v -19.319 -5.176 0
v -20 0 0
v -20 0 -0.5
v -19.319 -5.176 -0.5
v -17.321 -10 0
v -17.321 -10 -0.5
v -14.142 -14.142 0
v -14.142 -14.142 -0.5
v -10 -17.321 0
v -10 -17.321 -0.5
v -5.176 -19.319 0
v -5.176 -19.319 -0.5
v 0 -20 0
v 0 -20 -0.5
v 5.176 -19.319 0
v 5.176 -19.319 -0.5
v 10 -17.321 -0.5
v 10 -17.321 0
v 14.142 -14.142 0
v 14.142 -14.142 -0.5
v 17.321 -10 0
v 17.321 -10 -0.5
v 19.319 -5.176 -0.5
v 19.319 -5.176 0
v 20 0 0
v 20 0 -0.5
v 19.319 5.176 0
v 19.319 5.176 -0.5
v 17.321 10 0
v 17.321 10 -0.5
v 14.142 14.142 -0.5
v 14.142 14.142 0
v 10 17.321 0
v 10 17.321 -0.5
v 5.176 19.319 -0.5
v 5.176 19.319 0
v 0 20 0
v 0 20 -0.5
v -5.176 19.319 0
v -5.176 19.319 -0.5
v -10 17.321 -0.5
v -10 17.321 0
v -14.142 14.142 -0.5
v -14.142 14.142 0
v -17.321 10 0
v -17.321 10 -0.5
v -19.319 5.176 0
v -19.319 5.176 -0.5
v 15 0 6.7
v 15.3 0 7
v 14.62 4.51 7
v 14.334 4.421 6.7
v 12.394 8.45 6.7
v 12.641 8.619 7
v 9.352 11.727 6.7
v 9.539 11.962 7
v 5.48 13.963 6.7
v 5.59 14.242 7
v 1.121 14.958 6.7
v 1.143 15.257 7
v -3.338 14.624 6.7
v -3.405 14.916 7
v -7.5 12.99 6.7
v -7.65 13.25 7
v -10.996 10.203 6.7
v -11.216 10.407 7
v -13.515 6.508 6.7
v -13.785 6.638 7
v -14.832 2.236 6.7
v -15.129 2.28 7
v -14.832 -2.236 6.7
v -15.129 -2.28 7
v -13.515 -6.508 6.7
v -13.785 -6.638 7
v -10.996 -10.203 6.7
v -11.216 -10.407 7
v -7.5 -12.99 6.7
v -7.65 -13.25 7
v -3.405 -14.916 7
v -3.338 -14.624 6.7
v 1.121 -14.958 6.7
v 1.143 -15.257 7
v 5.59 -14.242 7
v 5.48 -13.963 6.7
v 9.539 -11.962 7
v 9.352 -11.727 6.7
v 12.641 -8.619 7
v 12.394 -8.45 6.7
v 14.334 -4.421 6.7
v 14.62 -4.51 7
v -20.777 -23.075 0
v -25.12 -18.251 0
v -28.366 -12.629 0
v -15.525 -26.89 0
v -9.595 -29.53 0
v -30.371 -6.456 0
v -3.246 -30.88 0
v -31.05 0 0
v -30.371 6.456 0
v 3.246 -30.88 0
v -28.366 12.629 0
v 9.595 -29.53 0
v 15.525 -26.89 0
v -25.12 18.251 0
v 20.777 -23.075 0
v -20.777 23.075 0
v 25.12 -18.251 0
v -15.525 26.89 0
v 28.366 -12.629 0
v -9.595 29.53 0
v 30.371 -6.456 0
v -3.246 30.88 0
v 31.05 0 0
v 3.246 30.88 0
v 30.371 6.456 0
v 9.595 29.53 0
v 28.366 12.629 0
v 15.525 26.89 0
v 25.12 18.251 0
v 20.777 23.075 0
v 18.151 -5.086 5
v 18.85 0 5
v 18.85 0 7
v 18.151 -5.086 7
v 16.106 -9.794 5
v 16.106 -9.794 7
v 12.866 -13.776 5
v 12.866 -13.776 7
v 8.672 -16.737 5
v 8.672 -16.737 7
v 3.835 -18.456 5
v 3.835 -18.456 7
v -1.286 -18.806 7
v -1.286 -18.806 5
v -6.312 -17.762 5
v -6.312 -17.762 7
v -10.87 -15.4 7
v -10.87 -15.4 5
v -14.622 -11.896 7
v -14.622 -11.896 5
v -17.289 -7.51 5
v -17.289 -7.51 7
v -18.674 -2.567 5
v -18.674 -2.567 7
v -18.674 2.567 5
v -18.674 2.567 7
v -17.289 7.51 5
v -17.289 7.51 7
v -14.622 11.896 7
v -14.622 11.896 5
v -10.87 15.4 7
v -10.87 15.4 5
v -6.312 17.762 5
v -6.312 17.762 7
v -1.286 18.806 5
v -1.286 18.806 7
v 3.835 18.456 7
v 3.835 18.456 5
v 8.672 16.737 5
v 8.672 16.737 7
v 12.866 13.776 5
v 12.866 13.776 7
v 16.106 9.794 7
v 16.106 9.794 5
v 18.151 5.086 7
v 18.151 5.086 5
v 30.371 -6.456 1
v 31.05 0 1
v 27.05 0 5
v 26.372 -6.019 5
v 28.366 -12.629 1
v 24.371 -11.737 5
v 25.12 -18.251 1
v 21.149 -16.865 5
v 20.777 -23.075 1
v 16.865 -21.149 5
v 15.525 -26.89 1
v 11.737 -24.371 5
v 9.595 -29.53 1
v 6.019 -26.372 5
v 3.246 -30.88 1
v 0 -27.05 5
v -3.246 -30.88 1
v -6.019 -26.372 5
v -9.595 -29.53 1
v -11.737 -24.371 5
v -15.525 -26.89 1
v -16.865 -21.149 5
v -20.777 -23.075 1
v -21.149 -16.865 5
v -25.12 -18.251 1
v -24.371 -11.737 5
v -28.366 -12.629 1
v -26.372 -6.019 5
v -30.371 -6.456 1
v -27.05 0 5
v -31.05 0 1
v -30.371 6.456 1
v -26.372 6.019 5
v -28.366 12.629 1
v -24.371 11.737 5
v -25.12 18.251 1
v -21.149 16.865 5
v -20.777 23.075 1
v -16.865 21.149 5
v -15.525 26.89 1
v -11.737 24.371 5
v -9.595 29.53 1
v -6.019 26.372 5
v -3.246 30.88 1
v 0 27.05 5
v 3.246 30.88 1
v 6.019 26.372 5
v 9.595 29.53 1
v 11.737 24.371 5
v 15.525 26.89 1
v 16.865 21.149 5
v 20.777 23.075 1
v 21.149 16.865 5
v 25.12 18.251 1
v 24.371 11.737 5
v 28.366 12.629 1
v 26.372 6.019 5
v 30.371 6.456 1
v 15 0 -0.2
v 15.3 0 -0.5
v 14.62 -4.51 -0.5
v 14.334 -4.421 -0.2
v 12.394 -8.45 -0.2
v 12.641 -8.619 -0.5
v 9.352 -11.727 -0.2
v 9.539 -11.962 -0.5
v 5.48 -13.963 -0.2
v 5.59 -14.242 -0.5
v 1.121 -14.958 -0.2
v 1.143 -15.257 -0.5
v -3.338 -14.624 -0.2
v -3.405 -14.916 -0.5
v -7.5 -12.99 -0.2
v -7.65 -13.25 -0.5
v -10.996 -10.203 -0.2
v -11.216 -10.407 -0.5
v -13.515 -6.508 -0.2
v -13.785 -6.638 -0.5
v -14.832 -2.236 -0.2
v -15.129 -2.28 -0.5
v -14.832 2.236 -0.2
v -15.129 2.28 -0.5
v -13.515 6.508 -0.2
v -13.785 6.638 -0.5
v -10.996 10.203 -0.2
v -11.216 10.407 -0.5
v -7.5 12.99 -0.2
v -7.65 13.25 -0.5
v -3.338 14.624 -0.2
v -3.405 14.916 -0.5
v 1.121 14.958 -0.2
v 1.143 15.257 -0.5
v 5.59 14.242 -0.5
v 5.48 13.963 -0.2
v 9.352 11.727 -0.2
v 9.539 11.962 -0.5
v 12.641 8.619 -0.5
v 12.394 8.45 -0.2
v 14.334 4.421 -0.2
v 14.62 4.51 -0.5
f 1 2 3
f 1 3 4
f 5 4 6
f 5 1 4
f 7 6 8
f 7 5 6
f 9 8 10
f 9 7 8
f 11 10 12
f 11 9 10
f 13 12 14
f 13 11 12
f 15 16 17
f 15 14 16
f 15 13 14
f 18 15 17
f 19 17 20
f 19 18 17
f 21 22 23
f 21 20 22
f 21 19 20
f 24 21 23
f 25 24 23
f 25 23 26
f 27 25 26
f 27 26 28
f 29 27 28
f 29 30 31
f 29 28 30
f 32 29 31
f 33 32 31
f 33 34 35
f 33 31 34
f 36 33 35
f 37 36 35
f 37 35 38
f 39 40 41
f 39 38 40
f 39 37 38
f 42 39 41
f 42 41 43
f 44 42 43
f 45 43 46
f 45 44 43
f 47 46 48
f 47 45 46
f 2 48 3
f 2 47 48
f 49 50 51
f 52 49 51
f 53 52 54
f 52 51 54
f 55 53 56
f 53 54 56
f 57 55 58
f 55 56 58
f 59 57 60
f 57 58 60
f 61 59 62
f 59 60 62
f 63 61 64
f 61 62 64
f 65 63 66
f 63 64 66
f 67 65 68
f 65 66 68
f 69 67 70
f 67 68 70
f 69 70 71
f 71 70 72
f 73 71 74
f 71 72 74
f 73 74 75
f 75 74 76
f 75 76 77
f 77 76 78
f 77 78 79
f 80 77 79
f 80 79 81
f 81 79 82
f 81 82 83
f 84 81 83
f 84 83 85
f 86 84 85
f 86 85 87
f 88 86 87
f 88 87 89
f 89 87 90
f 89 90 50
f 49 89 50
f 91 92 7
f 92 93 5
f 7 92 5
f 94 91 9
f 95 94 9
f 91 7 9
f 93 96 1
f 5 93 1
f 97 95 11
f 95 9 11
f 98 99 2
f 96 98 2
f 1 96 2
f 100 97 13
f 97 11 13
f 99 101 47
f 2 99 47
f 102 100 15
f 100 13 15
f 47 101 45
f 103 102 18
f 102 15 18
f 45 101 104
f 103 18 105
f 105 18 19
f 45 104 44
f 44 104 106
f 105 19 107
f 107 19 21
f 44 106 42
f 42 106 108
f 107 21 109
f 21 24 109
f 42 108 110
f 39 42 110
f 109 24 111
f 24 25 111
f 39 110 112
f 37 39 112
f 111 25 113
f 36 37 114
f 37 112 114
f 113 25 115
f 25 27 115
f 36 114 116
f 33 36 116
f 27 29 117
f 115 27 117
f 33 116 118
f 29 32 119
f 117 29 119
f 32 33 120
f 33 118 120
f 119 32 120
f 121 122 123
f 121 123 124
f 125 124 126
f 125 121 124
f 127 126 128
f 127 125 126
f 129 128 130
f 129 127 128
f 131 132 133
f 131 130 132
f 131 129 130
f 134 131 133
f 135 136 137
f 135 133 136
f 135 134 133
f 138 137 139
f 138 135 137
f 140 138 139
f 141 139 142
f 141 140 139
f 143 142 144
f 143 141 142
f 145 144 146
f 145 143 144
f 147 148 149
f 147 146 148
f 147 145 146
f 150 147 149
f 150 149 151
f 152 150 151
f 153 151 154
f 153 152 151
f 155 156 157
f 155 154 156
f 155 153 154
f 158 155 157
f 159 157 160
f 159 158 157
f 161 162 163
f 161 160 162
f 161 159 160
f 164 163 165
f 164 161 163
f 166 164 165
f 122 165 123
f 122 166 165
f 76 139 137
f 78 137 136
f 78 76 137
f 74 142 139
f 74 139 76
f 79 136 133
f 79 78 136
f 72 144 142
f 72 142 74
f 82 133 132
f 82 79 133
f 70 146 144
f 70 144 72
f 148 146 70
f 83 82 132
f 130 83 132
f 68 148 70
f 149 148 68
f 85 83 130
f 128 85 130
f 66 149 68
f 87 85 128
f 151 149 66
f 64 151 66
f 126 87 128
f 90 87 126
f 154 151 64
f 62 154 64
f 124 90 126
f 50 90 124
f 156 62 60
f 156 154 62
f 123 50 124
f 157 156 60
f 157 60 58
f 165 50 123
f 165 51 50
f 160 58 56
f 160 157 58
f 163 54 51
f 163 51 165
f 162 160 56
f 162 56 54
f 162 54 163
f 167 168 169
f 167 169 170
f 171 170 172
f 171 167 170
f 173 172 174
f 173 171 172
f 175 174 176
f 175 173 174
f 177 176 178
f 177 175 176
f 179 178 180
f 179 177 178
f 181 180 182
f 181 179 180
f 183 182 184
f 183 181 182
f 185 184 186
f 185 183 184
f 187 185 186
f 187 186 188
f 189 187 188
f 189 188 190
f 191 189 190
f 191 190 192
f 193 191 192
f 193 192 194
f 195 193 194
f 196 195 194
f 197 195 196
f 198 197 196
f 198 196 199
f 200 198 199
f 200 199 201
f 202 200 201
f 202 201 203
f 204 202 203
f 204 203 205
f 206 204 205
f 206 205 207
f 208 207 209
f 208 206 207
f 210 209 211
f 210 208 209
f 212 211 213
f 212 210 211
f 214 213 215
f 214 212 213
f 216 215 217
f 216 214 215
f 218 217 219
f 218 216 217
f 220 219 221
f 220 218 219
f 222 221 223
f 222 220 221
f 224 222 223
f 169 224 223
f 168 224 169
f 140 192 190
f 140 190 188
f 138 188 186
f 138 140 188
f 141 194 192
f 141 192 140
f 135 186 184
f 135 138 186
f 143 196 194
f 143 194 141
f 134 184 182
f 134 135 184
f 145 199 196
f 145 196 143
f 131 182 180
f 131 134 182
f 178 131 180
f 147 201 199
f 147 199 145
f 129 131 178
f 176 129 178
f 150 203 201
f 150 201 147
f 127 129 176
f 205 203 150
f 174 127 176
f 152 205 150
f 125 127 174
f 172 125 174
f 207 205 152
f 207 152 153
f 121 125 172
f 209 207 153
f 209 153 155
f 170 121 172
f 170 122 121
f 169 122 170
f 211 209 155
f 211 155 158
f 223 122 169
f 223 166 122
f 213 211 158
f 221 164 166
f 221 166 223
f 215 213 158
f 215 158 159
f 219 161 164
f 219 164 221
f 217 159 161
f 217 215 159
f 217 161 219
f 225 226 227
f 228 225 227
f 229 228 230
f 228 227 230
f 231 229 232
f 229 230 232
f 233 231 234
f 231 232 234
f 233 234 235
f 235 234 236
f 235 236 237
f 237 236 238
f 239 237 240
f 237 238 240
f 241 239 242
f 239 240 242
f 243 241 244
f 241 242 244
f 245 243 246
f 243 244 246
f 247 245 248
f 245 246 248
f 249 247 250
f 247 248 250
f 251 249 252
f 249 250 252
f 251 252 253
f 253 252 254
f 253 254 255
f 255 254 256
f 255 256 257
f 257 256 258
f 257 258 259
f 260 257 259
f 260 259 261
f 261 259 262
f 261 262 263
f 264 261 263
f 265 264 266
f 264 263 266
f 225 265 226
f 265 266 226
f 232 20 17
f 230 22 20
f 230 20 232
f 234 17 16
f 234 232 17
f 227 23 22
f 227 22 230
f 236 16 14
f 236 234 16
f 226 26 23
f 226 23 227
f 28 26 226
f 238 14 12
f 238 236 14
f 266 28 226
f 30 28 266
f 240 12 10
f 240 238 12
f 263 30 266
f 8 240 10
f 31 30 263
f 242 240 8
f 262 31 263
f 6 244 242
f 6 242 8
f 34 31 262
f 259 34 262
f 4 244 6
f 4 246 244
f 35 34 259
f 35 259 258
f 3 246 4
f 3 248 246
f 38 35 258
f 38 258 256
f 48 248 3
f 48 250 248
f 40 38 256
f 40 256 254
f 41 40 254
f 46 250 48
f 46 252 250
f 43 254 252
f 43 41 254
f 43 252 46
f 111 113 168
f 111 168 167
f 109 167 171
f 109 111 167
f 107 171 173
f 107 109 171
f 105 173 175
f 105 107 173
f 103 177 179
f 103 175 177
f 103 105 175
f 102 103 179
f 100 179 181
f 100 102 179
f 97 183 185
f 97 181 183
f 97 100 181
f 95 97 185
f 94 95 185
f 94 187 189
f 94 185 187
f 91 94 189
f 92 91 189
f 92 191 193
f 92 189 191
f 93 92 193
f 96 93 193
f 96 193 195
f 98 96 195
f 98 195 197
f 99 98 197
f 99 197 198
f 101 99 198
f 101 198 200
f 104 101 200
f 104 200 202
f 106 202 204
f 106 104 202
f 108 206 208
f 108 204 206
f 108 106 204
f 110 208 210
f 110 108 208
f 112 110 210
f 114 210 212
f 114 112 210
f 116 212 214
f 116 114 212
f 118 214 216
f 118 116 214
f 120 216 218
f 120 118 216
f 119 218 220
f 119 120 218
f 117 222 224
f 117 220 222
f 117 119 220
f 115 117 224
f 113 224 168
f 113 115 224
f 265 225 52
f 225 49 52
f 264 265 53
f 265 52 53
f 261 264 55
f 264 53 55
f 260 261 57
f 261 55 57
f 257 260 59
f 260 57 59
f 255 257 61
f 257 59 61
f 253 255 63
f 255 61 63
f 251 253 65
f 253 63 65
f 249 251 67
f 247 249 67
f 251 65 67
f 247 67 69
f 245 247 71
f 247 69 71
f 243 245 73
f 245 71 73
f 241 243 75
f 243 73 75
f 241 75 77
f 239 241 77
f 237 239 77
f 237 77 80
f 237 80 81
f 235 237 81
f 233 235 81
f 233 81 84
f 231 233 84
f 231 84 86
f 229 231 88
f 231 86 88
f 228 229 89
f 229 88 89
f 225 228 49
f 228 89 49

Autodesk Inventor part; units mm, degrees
ref_plane "YZ Plane" through (0, 0, 0) normal (1, 0, 0) x (0, 1, 0)
ref_plane "XZ Plane" through (0, 0, 0) normal (0, 1, 0) x (-1, 0, 0)
ref_plane "XY Plane" through (0, 0, 0) normal (0, 0, 1) x (1, 0, 0)
sketch "草圖1" plane through (0, 0, 0) normal (0, 0, 1) x (1, 0, 0)
  circle A0 centre (0, 0) radius 31.05
  dimension "d0" = 62.1
extrude "擠出1" add sketch "草圖1" along normal blind 5
sketch "草圖2" plane through (0, 0, 5) normal (0, 0, 1) x (1, 0, 0)
  circle A0 centre (0, 0) radius 18.85
  dimension "d3" = 37.7
extrude "擠出2" add sketch "草圖2" along normal blind 2
sketch "草圖3" plane through (0, 0, 0) normal (0, 0, -1) x (-1, 0, 0)
  circle A0 centre (0, 0) radius 20
  dimension "d6" = 40
extrude "擠出3" add sketch "草圖3" along normal blind 0.5
sketch "草圖4" plane through (0, 0, 7) normal (0, 0, 1) x (1, 0, 0)
  circle A0 centre (0, 0) radius 15
  dimension "d9" = 30
extrude "擠出4" cut sketch "草圖4" against normal blind 7.5
chamfer "倒角1" distance 4 angle 45 1 edges at (-31.05, 0, 5)
chamfer "倒角2" distance 0.3 angle 45 2 edges at (-15, 0, 7) (-15, 0, -0.5)
properties part number "KMB602PT-機械油封墊片"
